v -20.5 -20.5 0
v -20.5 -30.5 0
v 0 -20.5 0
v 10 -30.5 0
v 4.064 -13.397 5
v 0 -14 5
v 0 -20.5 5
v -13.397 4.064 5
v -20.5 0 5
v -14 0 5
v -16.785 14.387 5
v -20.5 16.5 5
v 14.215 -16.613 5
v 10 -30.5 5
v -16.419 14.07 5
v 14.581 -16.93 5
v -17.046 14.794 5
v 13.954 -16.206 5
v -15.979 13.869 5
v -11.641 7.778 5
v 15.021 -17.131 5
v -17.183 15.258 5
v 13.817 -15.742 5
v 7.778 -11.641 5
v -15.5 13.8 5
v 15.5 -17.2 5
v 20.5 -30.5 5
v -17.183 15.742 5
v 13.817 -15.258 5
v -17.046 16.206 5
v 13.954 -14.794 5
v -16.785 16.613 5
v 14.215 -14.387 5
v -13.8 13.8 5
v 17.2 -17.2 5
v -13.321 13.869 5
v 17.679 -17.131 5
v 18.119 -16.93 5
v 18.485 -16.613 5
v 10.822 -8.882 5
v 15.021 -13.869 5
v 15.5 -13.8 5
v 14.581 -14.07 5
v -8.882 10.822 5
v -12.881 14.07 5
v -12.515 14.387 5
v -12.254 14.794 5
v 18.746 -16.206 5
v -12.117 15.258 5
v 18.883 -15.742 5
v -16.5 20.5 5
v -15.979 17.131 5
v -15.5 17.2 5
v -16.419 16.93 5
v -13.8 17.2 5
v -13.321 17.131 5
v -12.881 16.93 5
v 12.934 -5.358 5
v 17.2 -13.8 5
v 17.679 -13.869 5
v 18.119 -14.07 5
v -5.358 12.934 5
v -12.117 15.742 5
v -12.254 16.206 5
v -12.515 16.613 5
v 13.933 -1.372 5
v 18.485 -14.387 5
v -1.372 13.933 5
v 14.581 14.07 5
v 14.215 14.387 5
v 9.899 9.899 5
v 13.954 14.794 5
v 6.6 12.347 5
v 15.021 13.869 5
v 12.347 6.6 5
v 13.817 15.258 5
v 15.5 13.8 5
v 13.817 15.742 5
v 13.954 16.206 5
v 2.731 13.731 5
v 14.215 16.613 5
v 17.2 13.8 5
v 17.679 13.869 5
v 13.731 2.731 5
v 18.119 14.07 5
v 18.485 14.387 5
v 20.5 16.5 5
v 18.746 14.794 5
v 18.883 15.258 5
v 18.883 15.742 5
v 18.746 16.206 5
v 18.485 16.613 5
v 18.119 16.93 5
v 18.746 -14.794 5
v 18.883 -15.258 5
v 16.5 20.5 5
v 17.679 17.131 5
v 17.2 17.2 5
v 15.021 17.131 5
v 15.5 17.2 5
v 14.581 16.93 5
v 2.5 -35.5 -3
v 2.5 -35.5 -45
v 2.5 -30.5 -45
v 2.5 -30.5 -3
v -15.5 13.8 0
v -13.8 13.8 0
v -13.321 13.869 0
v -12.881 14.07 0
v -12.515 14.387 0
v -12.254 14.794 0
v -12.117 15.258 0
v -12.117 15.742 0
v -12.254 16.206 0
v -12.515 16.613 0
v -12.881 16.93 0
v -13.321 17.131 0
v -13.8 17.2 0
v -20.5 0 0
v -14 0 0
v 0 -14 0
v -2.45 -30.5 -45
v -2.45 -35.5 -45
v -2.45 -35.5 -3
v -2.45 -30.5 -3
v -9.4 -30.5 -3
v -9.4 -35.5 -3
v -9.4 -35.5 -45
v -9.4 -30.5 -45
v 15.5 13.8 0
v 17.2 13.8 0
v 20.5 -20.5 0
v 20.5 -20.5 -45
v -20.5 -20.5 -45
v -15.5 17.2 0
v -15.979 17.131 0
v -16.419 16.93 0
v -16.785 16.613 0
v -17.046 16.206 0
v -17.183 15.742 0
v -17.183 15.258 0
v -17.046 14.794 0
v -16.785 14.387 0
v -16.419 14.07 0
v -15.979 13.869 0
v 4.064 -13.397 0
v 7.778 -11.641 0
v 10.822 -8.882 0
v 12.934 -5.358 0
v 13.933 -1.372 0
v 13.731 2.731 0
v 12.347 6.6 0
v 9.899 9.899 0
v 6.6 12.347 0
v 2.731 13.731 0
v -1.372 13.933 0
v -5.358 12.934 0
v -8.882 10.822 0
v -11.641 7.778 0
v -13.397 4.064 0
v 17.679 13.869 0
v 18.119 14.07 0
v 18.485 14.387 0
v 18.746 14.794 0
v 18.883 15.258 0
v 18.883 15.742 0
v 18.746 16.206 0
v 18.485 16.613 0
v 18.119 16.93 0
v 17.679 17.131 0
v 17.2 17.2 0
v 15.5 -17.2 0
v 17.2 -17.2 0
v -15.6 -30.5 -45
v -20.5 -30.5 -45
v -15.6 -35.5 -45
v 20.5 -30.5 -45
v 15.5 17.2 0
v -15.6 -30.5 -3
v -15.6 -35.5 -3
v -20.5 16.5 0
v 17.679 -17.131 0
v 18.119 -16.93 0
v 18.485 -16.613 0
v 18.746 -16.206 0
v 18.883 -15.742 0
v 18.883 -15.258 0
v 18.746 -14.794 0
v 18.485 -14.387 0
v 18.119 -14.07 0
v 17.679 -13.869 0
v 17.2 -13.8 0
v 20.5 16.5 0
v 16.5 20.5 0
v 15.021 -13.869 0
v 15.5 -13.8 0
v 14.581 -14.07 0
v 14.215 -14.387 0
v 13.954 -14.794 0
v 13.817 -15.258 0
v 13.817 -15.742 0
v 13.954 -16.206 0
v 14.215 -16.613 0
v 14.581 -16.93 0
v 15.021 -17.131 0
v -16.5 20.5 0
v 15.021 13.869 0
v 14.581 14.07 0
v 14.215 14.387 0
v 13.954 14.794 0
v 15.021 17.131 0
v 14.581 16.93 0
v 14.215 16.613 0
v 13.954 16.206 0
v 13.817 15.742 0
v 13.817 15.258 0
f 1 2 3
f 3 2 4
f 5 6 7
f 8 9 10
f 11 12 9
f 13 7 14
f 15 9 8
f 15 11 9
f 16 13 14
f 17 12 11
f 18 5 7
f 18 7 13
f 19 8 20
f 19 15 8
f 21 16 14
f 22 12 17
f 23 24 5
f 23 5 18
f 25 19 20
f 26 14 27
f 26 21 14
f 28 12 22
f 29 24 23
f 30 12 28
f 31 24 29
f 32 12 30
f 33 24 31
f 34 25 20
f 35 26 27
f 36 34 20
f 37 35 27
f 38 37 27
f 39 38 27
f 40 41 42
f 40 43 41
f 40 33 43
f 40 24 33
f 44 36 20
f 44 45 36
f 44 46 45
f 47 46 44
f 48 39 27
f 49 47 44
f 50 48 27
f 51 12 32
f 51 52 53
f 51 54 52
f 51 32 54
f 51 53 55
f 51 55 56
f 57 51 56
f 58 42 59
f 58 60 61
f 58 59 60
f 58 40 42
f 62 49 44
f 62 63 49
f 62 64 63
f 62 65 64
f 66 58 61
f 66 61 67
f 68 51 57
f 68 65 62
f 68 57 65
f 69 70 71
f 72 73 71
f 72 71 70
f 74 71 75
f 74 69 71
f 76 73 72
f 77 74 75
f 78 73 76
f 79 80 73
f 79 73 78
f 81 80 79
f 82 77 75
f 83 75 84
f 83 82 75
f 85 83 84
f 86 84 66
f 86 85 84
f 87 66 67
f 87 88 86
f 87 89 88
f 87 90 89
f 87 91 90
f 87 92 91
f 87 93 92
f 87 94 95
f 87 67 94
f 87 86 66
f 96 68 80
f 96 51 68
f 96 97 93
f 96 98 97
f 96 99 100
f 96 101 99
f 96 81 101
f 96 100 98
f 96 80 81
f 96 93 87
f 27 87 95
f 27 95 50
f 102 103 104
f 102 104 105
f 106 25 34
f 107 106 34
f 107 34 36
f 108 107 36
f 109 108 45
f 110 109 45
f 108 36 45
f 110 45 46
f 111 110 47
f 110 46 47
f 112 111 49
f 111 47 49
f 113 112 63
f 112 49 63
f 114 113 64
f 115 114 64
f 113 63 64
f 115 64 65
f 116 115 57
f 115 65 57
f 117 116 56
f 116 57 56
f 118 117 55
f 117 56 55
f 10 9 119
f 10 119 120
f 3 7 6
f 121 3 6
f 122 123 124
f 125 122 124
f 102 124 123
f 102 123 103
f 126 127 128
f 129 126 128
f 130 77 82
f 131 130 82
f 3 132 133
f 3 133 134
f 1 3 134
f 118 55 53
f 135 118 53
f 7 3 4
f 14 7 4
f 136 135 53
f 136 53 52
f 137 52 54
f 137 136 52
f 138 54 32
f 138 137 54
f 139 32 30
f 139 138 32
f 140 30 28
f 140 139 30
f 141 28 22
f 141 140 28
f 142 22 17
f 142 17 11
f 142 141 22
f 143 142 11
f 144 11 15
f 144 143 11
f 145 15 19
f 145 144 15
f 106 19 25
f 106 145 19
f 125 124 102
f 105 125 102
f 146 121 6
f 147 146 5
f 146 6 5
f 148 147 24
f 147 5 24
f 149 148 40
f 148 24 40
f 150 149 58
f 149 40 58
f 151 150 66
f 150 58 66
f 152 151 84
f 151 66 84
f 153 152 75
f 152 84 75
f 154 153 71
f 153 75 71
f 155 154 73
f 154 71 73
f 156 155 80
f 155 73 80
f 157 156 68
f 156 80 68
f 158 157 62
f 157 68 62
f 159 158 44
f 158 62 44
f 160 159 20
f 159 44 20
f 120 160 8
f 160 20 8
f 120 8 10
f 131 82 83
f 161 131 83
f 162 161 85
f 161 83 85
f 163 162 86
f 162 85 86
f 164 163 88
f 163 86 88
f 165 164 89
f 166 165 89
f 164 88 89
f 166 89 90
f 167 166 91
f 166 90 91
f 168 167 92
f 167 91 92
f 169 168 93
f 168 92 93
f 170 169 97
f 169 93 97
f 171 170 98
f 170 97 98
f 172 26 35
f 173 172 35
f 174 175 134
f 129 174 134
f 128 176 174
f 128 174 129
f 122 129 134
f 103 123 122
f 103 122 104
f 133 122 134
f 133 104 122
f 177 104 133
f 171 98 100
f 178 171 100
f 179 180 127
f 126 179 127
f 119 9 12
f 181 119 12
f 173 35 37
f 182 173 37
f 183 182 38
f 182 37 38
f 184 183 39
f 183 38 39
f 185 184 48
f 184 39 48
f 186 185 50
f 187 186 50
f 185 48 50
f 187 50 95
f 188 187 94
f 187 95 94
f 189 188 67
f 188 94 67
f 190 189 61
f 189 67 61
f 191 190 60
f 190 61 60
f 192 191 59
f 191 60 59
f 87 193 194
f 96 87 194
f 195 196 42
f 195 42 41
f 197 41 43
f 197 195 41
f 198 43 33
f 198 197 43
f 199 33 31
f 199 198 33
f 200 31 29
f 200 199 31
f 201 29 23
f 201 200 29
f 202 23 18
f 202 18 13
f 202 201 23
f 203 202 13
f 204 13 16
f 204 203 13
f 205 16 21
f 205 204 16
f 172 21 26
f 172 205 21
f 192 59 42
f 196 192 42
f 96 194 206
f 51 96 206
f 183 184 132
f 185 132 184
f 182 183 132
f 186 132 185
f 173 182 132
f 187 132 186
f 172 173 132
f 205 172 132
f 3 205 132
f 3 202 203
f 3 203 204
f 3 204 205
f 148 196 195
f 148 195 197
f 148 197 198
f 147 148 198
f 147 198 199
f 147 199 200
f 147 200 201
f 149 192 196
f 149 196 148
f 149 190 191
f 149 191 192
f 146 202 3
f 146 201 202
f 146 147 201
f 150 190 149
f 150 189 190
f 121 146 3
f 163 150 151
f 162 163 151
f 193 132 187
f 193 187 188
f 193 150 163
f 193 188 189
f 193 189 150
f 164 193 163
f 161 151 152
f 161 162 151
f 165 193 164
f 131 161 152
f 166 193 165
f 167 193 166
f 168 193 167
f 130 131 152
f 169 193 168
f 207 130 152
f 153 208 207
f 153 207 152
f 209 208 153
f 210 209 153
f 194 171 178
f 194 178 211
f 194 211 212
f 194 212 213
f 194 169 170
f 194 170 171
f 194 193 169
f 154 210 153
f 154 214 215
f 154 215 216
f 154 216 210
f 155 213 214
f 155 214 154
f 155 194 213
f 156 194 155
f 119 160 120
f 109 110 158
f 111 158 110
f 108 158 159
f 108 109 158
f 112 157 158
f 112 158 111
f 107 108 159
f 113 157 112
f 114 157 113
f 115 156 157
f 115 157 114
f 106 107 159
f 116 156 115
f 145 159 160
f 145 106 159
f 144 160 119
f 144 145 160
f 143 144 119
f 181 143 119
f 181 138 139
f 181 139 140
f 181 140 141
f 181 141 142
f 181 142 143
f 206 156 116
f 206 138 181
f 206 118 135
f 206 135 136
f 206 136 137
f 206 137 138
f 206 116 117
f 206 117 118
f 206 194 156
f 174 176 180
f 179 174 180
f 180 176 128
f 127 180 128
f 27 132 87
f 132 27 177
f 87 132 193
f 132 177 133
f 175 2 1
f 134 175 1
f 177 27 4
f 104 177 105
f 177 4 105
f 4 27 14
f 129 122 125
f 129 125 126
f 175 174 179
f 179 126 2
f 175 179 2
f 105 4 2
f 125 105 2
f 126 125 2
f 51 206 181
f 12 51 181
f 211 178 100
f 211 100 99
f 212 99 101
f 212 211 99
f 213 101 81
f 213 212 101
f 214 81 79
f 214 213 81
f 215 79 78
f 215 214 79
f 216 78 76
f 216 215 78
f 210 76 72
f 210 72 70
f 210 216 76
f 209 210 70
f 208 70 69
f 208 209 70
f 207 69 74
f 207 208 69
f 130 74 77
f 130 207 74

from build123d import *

# Parameters (mm, degrees)
SKETCH_1_R          = 11
SKETCH_1_R_2        = 1.7
EXTRUDE_1_DEPTH     = 5
EXTRUDE_2_DEPTH     = 4
SKETCH_3_W          = 41
SKETCH_3_H          = 10
EXTRUDE_3_DEPTH     = 45
EXTRUDE_4_DEPTH     = 5
CUT_EXTRUDE_1_DEPTH = 5
SKETCH_6_W          = 6.2
SKETCH_6_H          = 3
CUT_EXTRUDE_2_DEPTH = 5
SKETCH_8_R          = 11.5
CUT_EXTRUDE_3_DEPTH = 5
SKETCH_9_W          = 5
SKETCH_9_H          = 46
EXTRUDE_5_DEPTH     = 5
SKETCH_10_R         = 14
CUT_EXTRUDE_4_DEPTH = 5
SKETCH_11_W         = 20.5
SKETCH_11_H         = 30.5
CUT_EXTRUDE_5_DEPTH = 5
SKETCH_12_W         = 1
SKETCH_12_H         = 5
CUT_EXTRUDE_6_DEPTH = 20
CUT_EXTRUDE_7_DEPTH = 5
EXTRUDE_6_DEPTH     = 1
SKETCH_16_W         = 2
SKETCH_16_H         = 45
SKETCH_16_W_2       = 1.95
EXTRUDE_7_DEPTH     = 5
SKETCH_17_W         = 2
SKETCH_17_H         = 42
SKETCH_17_H_2       = 3
SKETCH_17_W_2       = 6.2
SKETCH_17_W_3       = 9.9
CUT_EXTRUDE_8_DEPTH = 5


with BuildPart() as part:
    # 草图1 → 凸台-拉伸1 (new body)
    with BuildSketch(Plane.XY):
        Polygon((-20.5, 0), (-20.5, -16.5), (-16.5, -20.5), (0, -20.5), (16.5, -20.5), (20.5, -16.5), (20.5, 0), (20.5, 16.5), (16.5, 20.5), (0, 20.5), (-16.5, 20.5), (-20.5, 16.5), align=None)
        Circle(SKETCH_1_R, mode=Mode.SUBTRACT)
        with Locations((15.5, -15.5)):
            Circle(SKETCH_1_R_2, mode=Mode.SUBTRACT)
        with Locations((15.5, 15.5)):
            Circle(SKETCH_1_R_2, mode=Mode.SUBTRACT)
        with Locations((-15.5, 15.5)):
            Circle(SKETCH_1_R_2, mode=Mode.SUBTRACT)
        with Locations((-15.5, -15.5)):
            Circle(SKETCH_1_R_2, mode=Mode.SUBTRACT)
    extrude(amount=EXTRUDE_1_DEPTH)

    # 草图2 → 凸台-拉伸2 (add)
    with BuildSketch(Plane(origin=(0, 0, 0), x_dir=(-1, 0, 0), z_dir=(0, 0, -1))):
        Polygon((-16.5, -30.5), (16.5, -30.5), (20.5, -30.5), (20.5, -16.5), (16.5, -20.5), (-16.5, -20.5), (-20.5, -16.5), (-20.5, -30.5), align=None)
    extrude(amount=-EXTRUDE_2_DEPTH)

    # 草图3 → 凸台-拉伸3 (add)
    with BuildSketch(Plane(origin=(0, 0, 0), x_dir=(-1, 0, 0), z_dir=(0, 0, -1))):
        with Locations((0, -25.5)):
            Rectangle(SKETCH_3_W, SKETCH_3_H)
    extrude(amount=EXTRUDE_3_DEPTH)

    # 草图4 → 凸台-拉伸4 (add)
    with BuildSketch(Plane.XZ.offset(30.5)):
        Polygon((-13.6, -2.908443575), (-13.6, 4), (-7.4, 4), (-7.4, -2.908443575), (-7.4, -45), (-13.6, -45), align=None)
    extrude(amount=EXTRUDE_4_DEPTH)

    # 草图5 → 切除-拉伸1 (cut)
    with BuildSketch(Plane.XY.offset(5)):
        with BuildLine():
            Line((15.5, 17.2), (15.5, 13.8))
            Line((15.5, 13.8), (17.2, 13.8))
            ThreePointArc((17.2, 13.8), (18.9, 15.5), (17.2, 17.2))
            Line((17.2, 17.2), (15.5, 17.2))
        make_face()
        with BuildLine():
            Line((15.5, -13.8), (15.5, -17.2))
            Line((15.5, -17.2), (17.2, -17.2))
            ThreePointArc((17.2, -17.2), (18.9, -15.5), (17.2, -13.8))
            Line((17.2, -13.8), (15.5, -13.8))
        make_face()
        with BuildLine():
            Line((-15.5, -13.8), (-15.5, -17.2))
            Line((-15.5, -17.2), (-13.8, -17.2))
            ThreePointArc((-13.8, -17.2), (-12.1, -15.5), (-13.8, -13.8))
            Line((-13.8, -13.8), (-15.5, -13.8))
        make_face()
        with BuildLine():
            Line((-15.5, 17.2), (-15.5, 13.8))
            Line((-15.5, 13.8), (-13.8, 13.8))
            ThreePointArc((-13.8, 13.8), (-12.1, 15.5), (-13.8, 17.2))
            Line((-13.8, 17.2), (-15.5, 17.2))
        make_face()
    extrude(amount=-CUT_EXTRUDE_1_DEPTH, mode=Mode.SUBTRACT)

    # 草图6 → 切除-拉伸2 (cut)
    with BuildSketch(Plane(origin=(0, -35.5, 0), x_dir=(-1, 0, 0), z_dir=(0, -1, 0))):
        with Locations((10.5, -2.5)):
            Rectangle(SKETCH_6_W, SKETCH_6_H)
    extrude(amount=-CUT_EXTRUDE_2_DEPTH, mode=Mode.SUBTRACT)

    # 草图8 → 切除-拉伸3 (cut)
    with BuildSketch(Plane.XY.offset(5)):
        Circle(SKETCH_8_R)
    extrude(amount=-CUT_EXTRUDE_3_DEPTH, mode=Mode.SUBTRACT)

    # 草图9 → 凸台-拉伸5 (add)
    with BuildSketch(Plane.XZ.offset(30.5)):
        with Locations((2, -22)):
            Rectangle(SKETCH_9_W, SKETCH_9_H)
    extrude(amount=EXTRUDE_5_DEPTH)

    # 草图10 → 切除-拉伸4 (cut)
    with BuildSketch(Plane.XY.offset(5)):
        Circle(SKETCH_10_R)
    extrude(amount=-CUT_EXTRUDE_4_DEPTH, mode=Mode.SUBTRACT)

    # 草图11 → 切除-拉伸5 (cut)
    with BuildSketch(Plane.XY.offset(5)):
        with Locations((-10.25, -15.25)):
            Rectangle(SKETCH_11_W, SKETCH_11_H)
    extrude(amount=-CUT_EXTRUDE_5_DEPTH, mode=Mode.SUBTRACT)

    # 草图12 → 切除-拉伸6 (cut)
    with BuildSketch(Plane.ZY.offset(13.6)):
        with Locations((0.5, -33)):
            Rectangle(SKETCH_12_W, SKETCH_12_H)
    extrude(amount=-CUT_EXTRUDE_6_DEPTH, mode=Mode.SUBTRACT)

    # 草图14 → 切除-拉伸7 (cut)
    with BuildSketch(Plane.XY.offset(5)):
        Polygon((0, -20.5), (10, -30.5), (0, -30.5), align=None)
    extrude(amount=-CUT_EXTRUDE_7_DEPTH, mode=Mode.SUBTRACT)

    # 草图15 → 凸台-拉伸6 (add)
    with BuildSketch(Plane.XY.offset(4)):
        Polygon((0, -20.5), (10, -30.5), (20.5, -30.5), (20.5, -16.5), (16.5, -20.5), align=None)
    extrude(amount=EXTRUDE_6_DEPTH)

    # 草图16 → 凸台-拉伸7 (add)
    with BuildSketch(Plane.XZ.offset(35.5)):
        with Locations((-14.6, -22.5)):
            Rectangle(SKETCH_16_W, SKETCH_16_H)
        with Locations((-1.475, -22.5)):
            Rectangle(SKETCH_16_W_2, SKETCH_16_H)
    extrude(amount=-EXTRUDE_7_DEPTH)

    # 草图17 → 切除-拉伸8 (cut)
    with BuildSketch(Plane.XZ.offset(35.5)):
        with Locations((-8.4, -24)):
            Rectangle(SKETCH_17_W, SKETCH_17_H)
        with Locations((-8.4, -1.5)):
            Rectangle(SKETCH_17_W, SKETCH_17_H_2)
        with Locations((-12.5, -1.5)):
            Rectangle(SKETCH_17_W_2, SKETCH_17_H_2)
        with Locations((-2.45, -1.5)):
            Rectangle(SKETCH_17_W_3, SKETCH_17_H_2)
        with Locations((3.5, -1.5)):
            Rectangle(SKETCH_17_W, SKETCH_17_H_2)
        with Locations((3.5, -24)):
            Rectangle(SKETCH_17_W, SKETCH_17_H)
    extrude(amount=-CUT_EXTRUDE_8_DEPTH, mode=Mode.SUBTRACT)


solid = part.part
